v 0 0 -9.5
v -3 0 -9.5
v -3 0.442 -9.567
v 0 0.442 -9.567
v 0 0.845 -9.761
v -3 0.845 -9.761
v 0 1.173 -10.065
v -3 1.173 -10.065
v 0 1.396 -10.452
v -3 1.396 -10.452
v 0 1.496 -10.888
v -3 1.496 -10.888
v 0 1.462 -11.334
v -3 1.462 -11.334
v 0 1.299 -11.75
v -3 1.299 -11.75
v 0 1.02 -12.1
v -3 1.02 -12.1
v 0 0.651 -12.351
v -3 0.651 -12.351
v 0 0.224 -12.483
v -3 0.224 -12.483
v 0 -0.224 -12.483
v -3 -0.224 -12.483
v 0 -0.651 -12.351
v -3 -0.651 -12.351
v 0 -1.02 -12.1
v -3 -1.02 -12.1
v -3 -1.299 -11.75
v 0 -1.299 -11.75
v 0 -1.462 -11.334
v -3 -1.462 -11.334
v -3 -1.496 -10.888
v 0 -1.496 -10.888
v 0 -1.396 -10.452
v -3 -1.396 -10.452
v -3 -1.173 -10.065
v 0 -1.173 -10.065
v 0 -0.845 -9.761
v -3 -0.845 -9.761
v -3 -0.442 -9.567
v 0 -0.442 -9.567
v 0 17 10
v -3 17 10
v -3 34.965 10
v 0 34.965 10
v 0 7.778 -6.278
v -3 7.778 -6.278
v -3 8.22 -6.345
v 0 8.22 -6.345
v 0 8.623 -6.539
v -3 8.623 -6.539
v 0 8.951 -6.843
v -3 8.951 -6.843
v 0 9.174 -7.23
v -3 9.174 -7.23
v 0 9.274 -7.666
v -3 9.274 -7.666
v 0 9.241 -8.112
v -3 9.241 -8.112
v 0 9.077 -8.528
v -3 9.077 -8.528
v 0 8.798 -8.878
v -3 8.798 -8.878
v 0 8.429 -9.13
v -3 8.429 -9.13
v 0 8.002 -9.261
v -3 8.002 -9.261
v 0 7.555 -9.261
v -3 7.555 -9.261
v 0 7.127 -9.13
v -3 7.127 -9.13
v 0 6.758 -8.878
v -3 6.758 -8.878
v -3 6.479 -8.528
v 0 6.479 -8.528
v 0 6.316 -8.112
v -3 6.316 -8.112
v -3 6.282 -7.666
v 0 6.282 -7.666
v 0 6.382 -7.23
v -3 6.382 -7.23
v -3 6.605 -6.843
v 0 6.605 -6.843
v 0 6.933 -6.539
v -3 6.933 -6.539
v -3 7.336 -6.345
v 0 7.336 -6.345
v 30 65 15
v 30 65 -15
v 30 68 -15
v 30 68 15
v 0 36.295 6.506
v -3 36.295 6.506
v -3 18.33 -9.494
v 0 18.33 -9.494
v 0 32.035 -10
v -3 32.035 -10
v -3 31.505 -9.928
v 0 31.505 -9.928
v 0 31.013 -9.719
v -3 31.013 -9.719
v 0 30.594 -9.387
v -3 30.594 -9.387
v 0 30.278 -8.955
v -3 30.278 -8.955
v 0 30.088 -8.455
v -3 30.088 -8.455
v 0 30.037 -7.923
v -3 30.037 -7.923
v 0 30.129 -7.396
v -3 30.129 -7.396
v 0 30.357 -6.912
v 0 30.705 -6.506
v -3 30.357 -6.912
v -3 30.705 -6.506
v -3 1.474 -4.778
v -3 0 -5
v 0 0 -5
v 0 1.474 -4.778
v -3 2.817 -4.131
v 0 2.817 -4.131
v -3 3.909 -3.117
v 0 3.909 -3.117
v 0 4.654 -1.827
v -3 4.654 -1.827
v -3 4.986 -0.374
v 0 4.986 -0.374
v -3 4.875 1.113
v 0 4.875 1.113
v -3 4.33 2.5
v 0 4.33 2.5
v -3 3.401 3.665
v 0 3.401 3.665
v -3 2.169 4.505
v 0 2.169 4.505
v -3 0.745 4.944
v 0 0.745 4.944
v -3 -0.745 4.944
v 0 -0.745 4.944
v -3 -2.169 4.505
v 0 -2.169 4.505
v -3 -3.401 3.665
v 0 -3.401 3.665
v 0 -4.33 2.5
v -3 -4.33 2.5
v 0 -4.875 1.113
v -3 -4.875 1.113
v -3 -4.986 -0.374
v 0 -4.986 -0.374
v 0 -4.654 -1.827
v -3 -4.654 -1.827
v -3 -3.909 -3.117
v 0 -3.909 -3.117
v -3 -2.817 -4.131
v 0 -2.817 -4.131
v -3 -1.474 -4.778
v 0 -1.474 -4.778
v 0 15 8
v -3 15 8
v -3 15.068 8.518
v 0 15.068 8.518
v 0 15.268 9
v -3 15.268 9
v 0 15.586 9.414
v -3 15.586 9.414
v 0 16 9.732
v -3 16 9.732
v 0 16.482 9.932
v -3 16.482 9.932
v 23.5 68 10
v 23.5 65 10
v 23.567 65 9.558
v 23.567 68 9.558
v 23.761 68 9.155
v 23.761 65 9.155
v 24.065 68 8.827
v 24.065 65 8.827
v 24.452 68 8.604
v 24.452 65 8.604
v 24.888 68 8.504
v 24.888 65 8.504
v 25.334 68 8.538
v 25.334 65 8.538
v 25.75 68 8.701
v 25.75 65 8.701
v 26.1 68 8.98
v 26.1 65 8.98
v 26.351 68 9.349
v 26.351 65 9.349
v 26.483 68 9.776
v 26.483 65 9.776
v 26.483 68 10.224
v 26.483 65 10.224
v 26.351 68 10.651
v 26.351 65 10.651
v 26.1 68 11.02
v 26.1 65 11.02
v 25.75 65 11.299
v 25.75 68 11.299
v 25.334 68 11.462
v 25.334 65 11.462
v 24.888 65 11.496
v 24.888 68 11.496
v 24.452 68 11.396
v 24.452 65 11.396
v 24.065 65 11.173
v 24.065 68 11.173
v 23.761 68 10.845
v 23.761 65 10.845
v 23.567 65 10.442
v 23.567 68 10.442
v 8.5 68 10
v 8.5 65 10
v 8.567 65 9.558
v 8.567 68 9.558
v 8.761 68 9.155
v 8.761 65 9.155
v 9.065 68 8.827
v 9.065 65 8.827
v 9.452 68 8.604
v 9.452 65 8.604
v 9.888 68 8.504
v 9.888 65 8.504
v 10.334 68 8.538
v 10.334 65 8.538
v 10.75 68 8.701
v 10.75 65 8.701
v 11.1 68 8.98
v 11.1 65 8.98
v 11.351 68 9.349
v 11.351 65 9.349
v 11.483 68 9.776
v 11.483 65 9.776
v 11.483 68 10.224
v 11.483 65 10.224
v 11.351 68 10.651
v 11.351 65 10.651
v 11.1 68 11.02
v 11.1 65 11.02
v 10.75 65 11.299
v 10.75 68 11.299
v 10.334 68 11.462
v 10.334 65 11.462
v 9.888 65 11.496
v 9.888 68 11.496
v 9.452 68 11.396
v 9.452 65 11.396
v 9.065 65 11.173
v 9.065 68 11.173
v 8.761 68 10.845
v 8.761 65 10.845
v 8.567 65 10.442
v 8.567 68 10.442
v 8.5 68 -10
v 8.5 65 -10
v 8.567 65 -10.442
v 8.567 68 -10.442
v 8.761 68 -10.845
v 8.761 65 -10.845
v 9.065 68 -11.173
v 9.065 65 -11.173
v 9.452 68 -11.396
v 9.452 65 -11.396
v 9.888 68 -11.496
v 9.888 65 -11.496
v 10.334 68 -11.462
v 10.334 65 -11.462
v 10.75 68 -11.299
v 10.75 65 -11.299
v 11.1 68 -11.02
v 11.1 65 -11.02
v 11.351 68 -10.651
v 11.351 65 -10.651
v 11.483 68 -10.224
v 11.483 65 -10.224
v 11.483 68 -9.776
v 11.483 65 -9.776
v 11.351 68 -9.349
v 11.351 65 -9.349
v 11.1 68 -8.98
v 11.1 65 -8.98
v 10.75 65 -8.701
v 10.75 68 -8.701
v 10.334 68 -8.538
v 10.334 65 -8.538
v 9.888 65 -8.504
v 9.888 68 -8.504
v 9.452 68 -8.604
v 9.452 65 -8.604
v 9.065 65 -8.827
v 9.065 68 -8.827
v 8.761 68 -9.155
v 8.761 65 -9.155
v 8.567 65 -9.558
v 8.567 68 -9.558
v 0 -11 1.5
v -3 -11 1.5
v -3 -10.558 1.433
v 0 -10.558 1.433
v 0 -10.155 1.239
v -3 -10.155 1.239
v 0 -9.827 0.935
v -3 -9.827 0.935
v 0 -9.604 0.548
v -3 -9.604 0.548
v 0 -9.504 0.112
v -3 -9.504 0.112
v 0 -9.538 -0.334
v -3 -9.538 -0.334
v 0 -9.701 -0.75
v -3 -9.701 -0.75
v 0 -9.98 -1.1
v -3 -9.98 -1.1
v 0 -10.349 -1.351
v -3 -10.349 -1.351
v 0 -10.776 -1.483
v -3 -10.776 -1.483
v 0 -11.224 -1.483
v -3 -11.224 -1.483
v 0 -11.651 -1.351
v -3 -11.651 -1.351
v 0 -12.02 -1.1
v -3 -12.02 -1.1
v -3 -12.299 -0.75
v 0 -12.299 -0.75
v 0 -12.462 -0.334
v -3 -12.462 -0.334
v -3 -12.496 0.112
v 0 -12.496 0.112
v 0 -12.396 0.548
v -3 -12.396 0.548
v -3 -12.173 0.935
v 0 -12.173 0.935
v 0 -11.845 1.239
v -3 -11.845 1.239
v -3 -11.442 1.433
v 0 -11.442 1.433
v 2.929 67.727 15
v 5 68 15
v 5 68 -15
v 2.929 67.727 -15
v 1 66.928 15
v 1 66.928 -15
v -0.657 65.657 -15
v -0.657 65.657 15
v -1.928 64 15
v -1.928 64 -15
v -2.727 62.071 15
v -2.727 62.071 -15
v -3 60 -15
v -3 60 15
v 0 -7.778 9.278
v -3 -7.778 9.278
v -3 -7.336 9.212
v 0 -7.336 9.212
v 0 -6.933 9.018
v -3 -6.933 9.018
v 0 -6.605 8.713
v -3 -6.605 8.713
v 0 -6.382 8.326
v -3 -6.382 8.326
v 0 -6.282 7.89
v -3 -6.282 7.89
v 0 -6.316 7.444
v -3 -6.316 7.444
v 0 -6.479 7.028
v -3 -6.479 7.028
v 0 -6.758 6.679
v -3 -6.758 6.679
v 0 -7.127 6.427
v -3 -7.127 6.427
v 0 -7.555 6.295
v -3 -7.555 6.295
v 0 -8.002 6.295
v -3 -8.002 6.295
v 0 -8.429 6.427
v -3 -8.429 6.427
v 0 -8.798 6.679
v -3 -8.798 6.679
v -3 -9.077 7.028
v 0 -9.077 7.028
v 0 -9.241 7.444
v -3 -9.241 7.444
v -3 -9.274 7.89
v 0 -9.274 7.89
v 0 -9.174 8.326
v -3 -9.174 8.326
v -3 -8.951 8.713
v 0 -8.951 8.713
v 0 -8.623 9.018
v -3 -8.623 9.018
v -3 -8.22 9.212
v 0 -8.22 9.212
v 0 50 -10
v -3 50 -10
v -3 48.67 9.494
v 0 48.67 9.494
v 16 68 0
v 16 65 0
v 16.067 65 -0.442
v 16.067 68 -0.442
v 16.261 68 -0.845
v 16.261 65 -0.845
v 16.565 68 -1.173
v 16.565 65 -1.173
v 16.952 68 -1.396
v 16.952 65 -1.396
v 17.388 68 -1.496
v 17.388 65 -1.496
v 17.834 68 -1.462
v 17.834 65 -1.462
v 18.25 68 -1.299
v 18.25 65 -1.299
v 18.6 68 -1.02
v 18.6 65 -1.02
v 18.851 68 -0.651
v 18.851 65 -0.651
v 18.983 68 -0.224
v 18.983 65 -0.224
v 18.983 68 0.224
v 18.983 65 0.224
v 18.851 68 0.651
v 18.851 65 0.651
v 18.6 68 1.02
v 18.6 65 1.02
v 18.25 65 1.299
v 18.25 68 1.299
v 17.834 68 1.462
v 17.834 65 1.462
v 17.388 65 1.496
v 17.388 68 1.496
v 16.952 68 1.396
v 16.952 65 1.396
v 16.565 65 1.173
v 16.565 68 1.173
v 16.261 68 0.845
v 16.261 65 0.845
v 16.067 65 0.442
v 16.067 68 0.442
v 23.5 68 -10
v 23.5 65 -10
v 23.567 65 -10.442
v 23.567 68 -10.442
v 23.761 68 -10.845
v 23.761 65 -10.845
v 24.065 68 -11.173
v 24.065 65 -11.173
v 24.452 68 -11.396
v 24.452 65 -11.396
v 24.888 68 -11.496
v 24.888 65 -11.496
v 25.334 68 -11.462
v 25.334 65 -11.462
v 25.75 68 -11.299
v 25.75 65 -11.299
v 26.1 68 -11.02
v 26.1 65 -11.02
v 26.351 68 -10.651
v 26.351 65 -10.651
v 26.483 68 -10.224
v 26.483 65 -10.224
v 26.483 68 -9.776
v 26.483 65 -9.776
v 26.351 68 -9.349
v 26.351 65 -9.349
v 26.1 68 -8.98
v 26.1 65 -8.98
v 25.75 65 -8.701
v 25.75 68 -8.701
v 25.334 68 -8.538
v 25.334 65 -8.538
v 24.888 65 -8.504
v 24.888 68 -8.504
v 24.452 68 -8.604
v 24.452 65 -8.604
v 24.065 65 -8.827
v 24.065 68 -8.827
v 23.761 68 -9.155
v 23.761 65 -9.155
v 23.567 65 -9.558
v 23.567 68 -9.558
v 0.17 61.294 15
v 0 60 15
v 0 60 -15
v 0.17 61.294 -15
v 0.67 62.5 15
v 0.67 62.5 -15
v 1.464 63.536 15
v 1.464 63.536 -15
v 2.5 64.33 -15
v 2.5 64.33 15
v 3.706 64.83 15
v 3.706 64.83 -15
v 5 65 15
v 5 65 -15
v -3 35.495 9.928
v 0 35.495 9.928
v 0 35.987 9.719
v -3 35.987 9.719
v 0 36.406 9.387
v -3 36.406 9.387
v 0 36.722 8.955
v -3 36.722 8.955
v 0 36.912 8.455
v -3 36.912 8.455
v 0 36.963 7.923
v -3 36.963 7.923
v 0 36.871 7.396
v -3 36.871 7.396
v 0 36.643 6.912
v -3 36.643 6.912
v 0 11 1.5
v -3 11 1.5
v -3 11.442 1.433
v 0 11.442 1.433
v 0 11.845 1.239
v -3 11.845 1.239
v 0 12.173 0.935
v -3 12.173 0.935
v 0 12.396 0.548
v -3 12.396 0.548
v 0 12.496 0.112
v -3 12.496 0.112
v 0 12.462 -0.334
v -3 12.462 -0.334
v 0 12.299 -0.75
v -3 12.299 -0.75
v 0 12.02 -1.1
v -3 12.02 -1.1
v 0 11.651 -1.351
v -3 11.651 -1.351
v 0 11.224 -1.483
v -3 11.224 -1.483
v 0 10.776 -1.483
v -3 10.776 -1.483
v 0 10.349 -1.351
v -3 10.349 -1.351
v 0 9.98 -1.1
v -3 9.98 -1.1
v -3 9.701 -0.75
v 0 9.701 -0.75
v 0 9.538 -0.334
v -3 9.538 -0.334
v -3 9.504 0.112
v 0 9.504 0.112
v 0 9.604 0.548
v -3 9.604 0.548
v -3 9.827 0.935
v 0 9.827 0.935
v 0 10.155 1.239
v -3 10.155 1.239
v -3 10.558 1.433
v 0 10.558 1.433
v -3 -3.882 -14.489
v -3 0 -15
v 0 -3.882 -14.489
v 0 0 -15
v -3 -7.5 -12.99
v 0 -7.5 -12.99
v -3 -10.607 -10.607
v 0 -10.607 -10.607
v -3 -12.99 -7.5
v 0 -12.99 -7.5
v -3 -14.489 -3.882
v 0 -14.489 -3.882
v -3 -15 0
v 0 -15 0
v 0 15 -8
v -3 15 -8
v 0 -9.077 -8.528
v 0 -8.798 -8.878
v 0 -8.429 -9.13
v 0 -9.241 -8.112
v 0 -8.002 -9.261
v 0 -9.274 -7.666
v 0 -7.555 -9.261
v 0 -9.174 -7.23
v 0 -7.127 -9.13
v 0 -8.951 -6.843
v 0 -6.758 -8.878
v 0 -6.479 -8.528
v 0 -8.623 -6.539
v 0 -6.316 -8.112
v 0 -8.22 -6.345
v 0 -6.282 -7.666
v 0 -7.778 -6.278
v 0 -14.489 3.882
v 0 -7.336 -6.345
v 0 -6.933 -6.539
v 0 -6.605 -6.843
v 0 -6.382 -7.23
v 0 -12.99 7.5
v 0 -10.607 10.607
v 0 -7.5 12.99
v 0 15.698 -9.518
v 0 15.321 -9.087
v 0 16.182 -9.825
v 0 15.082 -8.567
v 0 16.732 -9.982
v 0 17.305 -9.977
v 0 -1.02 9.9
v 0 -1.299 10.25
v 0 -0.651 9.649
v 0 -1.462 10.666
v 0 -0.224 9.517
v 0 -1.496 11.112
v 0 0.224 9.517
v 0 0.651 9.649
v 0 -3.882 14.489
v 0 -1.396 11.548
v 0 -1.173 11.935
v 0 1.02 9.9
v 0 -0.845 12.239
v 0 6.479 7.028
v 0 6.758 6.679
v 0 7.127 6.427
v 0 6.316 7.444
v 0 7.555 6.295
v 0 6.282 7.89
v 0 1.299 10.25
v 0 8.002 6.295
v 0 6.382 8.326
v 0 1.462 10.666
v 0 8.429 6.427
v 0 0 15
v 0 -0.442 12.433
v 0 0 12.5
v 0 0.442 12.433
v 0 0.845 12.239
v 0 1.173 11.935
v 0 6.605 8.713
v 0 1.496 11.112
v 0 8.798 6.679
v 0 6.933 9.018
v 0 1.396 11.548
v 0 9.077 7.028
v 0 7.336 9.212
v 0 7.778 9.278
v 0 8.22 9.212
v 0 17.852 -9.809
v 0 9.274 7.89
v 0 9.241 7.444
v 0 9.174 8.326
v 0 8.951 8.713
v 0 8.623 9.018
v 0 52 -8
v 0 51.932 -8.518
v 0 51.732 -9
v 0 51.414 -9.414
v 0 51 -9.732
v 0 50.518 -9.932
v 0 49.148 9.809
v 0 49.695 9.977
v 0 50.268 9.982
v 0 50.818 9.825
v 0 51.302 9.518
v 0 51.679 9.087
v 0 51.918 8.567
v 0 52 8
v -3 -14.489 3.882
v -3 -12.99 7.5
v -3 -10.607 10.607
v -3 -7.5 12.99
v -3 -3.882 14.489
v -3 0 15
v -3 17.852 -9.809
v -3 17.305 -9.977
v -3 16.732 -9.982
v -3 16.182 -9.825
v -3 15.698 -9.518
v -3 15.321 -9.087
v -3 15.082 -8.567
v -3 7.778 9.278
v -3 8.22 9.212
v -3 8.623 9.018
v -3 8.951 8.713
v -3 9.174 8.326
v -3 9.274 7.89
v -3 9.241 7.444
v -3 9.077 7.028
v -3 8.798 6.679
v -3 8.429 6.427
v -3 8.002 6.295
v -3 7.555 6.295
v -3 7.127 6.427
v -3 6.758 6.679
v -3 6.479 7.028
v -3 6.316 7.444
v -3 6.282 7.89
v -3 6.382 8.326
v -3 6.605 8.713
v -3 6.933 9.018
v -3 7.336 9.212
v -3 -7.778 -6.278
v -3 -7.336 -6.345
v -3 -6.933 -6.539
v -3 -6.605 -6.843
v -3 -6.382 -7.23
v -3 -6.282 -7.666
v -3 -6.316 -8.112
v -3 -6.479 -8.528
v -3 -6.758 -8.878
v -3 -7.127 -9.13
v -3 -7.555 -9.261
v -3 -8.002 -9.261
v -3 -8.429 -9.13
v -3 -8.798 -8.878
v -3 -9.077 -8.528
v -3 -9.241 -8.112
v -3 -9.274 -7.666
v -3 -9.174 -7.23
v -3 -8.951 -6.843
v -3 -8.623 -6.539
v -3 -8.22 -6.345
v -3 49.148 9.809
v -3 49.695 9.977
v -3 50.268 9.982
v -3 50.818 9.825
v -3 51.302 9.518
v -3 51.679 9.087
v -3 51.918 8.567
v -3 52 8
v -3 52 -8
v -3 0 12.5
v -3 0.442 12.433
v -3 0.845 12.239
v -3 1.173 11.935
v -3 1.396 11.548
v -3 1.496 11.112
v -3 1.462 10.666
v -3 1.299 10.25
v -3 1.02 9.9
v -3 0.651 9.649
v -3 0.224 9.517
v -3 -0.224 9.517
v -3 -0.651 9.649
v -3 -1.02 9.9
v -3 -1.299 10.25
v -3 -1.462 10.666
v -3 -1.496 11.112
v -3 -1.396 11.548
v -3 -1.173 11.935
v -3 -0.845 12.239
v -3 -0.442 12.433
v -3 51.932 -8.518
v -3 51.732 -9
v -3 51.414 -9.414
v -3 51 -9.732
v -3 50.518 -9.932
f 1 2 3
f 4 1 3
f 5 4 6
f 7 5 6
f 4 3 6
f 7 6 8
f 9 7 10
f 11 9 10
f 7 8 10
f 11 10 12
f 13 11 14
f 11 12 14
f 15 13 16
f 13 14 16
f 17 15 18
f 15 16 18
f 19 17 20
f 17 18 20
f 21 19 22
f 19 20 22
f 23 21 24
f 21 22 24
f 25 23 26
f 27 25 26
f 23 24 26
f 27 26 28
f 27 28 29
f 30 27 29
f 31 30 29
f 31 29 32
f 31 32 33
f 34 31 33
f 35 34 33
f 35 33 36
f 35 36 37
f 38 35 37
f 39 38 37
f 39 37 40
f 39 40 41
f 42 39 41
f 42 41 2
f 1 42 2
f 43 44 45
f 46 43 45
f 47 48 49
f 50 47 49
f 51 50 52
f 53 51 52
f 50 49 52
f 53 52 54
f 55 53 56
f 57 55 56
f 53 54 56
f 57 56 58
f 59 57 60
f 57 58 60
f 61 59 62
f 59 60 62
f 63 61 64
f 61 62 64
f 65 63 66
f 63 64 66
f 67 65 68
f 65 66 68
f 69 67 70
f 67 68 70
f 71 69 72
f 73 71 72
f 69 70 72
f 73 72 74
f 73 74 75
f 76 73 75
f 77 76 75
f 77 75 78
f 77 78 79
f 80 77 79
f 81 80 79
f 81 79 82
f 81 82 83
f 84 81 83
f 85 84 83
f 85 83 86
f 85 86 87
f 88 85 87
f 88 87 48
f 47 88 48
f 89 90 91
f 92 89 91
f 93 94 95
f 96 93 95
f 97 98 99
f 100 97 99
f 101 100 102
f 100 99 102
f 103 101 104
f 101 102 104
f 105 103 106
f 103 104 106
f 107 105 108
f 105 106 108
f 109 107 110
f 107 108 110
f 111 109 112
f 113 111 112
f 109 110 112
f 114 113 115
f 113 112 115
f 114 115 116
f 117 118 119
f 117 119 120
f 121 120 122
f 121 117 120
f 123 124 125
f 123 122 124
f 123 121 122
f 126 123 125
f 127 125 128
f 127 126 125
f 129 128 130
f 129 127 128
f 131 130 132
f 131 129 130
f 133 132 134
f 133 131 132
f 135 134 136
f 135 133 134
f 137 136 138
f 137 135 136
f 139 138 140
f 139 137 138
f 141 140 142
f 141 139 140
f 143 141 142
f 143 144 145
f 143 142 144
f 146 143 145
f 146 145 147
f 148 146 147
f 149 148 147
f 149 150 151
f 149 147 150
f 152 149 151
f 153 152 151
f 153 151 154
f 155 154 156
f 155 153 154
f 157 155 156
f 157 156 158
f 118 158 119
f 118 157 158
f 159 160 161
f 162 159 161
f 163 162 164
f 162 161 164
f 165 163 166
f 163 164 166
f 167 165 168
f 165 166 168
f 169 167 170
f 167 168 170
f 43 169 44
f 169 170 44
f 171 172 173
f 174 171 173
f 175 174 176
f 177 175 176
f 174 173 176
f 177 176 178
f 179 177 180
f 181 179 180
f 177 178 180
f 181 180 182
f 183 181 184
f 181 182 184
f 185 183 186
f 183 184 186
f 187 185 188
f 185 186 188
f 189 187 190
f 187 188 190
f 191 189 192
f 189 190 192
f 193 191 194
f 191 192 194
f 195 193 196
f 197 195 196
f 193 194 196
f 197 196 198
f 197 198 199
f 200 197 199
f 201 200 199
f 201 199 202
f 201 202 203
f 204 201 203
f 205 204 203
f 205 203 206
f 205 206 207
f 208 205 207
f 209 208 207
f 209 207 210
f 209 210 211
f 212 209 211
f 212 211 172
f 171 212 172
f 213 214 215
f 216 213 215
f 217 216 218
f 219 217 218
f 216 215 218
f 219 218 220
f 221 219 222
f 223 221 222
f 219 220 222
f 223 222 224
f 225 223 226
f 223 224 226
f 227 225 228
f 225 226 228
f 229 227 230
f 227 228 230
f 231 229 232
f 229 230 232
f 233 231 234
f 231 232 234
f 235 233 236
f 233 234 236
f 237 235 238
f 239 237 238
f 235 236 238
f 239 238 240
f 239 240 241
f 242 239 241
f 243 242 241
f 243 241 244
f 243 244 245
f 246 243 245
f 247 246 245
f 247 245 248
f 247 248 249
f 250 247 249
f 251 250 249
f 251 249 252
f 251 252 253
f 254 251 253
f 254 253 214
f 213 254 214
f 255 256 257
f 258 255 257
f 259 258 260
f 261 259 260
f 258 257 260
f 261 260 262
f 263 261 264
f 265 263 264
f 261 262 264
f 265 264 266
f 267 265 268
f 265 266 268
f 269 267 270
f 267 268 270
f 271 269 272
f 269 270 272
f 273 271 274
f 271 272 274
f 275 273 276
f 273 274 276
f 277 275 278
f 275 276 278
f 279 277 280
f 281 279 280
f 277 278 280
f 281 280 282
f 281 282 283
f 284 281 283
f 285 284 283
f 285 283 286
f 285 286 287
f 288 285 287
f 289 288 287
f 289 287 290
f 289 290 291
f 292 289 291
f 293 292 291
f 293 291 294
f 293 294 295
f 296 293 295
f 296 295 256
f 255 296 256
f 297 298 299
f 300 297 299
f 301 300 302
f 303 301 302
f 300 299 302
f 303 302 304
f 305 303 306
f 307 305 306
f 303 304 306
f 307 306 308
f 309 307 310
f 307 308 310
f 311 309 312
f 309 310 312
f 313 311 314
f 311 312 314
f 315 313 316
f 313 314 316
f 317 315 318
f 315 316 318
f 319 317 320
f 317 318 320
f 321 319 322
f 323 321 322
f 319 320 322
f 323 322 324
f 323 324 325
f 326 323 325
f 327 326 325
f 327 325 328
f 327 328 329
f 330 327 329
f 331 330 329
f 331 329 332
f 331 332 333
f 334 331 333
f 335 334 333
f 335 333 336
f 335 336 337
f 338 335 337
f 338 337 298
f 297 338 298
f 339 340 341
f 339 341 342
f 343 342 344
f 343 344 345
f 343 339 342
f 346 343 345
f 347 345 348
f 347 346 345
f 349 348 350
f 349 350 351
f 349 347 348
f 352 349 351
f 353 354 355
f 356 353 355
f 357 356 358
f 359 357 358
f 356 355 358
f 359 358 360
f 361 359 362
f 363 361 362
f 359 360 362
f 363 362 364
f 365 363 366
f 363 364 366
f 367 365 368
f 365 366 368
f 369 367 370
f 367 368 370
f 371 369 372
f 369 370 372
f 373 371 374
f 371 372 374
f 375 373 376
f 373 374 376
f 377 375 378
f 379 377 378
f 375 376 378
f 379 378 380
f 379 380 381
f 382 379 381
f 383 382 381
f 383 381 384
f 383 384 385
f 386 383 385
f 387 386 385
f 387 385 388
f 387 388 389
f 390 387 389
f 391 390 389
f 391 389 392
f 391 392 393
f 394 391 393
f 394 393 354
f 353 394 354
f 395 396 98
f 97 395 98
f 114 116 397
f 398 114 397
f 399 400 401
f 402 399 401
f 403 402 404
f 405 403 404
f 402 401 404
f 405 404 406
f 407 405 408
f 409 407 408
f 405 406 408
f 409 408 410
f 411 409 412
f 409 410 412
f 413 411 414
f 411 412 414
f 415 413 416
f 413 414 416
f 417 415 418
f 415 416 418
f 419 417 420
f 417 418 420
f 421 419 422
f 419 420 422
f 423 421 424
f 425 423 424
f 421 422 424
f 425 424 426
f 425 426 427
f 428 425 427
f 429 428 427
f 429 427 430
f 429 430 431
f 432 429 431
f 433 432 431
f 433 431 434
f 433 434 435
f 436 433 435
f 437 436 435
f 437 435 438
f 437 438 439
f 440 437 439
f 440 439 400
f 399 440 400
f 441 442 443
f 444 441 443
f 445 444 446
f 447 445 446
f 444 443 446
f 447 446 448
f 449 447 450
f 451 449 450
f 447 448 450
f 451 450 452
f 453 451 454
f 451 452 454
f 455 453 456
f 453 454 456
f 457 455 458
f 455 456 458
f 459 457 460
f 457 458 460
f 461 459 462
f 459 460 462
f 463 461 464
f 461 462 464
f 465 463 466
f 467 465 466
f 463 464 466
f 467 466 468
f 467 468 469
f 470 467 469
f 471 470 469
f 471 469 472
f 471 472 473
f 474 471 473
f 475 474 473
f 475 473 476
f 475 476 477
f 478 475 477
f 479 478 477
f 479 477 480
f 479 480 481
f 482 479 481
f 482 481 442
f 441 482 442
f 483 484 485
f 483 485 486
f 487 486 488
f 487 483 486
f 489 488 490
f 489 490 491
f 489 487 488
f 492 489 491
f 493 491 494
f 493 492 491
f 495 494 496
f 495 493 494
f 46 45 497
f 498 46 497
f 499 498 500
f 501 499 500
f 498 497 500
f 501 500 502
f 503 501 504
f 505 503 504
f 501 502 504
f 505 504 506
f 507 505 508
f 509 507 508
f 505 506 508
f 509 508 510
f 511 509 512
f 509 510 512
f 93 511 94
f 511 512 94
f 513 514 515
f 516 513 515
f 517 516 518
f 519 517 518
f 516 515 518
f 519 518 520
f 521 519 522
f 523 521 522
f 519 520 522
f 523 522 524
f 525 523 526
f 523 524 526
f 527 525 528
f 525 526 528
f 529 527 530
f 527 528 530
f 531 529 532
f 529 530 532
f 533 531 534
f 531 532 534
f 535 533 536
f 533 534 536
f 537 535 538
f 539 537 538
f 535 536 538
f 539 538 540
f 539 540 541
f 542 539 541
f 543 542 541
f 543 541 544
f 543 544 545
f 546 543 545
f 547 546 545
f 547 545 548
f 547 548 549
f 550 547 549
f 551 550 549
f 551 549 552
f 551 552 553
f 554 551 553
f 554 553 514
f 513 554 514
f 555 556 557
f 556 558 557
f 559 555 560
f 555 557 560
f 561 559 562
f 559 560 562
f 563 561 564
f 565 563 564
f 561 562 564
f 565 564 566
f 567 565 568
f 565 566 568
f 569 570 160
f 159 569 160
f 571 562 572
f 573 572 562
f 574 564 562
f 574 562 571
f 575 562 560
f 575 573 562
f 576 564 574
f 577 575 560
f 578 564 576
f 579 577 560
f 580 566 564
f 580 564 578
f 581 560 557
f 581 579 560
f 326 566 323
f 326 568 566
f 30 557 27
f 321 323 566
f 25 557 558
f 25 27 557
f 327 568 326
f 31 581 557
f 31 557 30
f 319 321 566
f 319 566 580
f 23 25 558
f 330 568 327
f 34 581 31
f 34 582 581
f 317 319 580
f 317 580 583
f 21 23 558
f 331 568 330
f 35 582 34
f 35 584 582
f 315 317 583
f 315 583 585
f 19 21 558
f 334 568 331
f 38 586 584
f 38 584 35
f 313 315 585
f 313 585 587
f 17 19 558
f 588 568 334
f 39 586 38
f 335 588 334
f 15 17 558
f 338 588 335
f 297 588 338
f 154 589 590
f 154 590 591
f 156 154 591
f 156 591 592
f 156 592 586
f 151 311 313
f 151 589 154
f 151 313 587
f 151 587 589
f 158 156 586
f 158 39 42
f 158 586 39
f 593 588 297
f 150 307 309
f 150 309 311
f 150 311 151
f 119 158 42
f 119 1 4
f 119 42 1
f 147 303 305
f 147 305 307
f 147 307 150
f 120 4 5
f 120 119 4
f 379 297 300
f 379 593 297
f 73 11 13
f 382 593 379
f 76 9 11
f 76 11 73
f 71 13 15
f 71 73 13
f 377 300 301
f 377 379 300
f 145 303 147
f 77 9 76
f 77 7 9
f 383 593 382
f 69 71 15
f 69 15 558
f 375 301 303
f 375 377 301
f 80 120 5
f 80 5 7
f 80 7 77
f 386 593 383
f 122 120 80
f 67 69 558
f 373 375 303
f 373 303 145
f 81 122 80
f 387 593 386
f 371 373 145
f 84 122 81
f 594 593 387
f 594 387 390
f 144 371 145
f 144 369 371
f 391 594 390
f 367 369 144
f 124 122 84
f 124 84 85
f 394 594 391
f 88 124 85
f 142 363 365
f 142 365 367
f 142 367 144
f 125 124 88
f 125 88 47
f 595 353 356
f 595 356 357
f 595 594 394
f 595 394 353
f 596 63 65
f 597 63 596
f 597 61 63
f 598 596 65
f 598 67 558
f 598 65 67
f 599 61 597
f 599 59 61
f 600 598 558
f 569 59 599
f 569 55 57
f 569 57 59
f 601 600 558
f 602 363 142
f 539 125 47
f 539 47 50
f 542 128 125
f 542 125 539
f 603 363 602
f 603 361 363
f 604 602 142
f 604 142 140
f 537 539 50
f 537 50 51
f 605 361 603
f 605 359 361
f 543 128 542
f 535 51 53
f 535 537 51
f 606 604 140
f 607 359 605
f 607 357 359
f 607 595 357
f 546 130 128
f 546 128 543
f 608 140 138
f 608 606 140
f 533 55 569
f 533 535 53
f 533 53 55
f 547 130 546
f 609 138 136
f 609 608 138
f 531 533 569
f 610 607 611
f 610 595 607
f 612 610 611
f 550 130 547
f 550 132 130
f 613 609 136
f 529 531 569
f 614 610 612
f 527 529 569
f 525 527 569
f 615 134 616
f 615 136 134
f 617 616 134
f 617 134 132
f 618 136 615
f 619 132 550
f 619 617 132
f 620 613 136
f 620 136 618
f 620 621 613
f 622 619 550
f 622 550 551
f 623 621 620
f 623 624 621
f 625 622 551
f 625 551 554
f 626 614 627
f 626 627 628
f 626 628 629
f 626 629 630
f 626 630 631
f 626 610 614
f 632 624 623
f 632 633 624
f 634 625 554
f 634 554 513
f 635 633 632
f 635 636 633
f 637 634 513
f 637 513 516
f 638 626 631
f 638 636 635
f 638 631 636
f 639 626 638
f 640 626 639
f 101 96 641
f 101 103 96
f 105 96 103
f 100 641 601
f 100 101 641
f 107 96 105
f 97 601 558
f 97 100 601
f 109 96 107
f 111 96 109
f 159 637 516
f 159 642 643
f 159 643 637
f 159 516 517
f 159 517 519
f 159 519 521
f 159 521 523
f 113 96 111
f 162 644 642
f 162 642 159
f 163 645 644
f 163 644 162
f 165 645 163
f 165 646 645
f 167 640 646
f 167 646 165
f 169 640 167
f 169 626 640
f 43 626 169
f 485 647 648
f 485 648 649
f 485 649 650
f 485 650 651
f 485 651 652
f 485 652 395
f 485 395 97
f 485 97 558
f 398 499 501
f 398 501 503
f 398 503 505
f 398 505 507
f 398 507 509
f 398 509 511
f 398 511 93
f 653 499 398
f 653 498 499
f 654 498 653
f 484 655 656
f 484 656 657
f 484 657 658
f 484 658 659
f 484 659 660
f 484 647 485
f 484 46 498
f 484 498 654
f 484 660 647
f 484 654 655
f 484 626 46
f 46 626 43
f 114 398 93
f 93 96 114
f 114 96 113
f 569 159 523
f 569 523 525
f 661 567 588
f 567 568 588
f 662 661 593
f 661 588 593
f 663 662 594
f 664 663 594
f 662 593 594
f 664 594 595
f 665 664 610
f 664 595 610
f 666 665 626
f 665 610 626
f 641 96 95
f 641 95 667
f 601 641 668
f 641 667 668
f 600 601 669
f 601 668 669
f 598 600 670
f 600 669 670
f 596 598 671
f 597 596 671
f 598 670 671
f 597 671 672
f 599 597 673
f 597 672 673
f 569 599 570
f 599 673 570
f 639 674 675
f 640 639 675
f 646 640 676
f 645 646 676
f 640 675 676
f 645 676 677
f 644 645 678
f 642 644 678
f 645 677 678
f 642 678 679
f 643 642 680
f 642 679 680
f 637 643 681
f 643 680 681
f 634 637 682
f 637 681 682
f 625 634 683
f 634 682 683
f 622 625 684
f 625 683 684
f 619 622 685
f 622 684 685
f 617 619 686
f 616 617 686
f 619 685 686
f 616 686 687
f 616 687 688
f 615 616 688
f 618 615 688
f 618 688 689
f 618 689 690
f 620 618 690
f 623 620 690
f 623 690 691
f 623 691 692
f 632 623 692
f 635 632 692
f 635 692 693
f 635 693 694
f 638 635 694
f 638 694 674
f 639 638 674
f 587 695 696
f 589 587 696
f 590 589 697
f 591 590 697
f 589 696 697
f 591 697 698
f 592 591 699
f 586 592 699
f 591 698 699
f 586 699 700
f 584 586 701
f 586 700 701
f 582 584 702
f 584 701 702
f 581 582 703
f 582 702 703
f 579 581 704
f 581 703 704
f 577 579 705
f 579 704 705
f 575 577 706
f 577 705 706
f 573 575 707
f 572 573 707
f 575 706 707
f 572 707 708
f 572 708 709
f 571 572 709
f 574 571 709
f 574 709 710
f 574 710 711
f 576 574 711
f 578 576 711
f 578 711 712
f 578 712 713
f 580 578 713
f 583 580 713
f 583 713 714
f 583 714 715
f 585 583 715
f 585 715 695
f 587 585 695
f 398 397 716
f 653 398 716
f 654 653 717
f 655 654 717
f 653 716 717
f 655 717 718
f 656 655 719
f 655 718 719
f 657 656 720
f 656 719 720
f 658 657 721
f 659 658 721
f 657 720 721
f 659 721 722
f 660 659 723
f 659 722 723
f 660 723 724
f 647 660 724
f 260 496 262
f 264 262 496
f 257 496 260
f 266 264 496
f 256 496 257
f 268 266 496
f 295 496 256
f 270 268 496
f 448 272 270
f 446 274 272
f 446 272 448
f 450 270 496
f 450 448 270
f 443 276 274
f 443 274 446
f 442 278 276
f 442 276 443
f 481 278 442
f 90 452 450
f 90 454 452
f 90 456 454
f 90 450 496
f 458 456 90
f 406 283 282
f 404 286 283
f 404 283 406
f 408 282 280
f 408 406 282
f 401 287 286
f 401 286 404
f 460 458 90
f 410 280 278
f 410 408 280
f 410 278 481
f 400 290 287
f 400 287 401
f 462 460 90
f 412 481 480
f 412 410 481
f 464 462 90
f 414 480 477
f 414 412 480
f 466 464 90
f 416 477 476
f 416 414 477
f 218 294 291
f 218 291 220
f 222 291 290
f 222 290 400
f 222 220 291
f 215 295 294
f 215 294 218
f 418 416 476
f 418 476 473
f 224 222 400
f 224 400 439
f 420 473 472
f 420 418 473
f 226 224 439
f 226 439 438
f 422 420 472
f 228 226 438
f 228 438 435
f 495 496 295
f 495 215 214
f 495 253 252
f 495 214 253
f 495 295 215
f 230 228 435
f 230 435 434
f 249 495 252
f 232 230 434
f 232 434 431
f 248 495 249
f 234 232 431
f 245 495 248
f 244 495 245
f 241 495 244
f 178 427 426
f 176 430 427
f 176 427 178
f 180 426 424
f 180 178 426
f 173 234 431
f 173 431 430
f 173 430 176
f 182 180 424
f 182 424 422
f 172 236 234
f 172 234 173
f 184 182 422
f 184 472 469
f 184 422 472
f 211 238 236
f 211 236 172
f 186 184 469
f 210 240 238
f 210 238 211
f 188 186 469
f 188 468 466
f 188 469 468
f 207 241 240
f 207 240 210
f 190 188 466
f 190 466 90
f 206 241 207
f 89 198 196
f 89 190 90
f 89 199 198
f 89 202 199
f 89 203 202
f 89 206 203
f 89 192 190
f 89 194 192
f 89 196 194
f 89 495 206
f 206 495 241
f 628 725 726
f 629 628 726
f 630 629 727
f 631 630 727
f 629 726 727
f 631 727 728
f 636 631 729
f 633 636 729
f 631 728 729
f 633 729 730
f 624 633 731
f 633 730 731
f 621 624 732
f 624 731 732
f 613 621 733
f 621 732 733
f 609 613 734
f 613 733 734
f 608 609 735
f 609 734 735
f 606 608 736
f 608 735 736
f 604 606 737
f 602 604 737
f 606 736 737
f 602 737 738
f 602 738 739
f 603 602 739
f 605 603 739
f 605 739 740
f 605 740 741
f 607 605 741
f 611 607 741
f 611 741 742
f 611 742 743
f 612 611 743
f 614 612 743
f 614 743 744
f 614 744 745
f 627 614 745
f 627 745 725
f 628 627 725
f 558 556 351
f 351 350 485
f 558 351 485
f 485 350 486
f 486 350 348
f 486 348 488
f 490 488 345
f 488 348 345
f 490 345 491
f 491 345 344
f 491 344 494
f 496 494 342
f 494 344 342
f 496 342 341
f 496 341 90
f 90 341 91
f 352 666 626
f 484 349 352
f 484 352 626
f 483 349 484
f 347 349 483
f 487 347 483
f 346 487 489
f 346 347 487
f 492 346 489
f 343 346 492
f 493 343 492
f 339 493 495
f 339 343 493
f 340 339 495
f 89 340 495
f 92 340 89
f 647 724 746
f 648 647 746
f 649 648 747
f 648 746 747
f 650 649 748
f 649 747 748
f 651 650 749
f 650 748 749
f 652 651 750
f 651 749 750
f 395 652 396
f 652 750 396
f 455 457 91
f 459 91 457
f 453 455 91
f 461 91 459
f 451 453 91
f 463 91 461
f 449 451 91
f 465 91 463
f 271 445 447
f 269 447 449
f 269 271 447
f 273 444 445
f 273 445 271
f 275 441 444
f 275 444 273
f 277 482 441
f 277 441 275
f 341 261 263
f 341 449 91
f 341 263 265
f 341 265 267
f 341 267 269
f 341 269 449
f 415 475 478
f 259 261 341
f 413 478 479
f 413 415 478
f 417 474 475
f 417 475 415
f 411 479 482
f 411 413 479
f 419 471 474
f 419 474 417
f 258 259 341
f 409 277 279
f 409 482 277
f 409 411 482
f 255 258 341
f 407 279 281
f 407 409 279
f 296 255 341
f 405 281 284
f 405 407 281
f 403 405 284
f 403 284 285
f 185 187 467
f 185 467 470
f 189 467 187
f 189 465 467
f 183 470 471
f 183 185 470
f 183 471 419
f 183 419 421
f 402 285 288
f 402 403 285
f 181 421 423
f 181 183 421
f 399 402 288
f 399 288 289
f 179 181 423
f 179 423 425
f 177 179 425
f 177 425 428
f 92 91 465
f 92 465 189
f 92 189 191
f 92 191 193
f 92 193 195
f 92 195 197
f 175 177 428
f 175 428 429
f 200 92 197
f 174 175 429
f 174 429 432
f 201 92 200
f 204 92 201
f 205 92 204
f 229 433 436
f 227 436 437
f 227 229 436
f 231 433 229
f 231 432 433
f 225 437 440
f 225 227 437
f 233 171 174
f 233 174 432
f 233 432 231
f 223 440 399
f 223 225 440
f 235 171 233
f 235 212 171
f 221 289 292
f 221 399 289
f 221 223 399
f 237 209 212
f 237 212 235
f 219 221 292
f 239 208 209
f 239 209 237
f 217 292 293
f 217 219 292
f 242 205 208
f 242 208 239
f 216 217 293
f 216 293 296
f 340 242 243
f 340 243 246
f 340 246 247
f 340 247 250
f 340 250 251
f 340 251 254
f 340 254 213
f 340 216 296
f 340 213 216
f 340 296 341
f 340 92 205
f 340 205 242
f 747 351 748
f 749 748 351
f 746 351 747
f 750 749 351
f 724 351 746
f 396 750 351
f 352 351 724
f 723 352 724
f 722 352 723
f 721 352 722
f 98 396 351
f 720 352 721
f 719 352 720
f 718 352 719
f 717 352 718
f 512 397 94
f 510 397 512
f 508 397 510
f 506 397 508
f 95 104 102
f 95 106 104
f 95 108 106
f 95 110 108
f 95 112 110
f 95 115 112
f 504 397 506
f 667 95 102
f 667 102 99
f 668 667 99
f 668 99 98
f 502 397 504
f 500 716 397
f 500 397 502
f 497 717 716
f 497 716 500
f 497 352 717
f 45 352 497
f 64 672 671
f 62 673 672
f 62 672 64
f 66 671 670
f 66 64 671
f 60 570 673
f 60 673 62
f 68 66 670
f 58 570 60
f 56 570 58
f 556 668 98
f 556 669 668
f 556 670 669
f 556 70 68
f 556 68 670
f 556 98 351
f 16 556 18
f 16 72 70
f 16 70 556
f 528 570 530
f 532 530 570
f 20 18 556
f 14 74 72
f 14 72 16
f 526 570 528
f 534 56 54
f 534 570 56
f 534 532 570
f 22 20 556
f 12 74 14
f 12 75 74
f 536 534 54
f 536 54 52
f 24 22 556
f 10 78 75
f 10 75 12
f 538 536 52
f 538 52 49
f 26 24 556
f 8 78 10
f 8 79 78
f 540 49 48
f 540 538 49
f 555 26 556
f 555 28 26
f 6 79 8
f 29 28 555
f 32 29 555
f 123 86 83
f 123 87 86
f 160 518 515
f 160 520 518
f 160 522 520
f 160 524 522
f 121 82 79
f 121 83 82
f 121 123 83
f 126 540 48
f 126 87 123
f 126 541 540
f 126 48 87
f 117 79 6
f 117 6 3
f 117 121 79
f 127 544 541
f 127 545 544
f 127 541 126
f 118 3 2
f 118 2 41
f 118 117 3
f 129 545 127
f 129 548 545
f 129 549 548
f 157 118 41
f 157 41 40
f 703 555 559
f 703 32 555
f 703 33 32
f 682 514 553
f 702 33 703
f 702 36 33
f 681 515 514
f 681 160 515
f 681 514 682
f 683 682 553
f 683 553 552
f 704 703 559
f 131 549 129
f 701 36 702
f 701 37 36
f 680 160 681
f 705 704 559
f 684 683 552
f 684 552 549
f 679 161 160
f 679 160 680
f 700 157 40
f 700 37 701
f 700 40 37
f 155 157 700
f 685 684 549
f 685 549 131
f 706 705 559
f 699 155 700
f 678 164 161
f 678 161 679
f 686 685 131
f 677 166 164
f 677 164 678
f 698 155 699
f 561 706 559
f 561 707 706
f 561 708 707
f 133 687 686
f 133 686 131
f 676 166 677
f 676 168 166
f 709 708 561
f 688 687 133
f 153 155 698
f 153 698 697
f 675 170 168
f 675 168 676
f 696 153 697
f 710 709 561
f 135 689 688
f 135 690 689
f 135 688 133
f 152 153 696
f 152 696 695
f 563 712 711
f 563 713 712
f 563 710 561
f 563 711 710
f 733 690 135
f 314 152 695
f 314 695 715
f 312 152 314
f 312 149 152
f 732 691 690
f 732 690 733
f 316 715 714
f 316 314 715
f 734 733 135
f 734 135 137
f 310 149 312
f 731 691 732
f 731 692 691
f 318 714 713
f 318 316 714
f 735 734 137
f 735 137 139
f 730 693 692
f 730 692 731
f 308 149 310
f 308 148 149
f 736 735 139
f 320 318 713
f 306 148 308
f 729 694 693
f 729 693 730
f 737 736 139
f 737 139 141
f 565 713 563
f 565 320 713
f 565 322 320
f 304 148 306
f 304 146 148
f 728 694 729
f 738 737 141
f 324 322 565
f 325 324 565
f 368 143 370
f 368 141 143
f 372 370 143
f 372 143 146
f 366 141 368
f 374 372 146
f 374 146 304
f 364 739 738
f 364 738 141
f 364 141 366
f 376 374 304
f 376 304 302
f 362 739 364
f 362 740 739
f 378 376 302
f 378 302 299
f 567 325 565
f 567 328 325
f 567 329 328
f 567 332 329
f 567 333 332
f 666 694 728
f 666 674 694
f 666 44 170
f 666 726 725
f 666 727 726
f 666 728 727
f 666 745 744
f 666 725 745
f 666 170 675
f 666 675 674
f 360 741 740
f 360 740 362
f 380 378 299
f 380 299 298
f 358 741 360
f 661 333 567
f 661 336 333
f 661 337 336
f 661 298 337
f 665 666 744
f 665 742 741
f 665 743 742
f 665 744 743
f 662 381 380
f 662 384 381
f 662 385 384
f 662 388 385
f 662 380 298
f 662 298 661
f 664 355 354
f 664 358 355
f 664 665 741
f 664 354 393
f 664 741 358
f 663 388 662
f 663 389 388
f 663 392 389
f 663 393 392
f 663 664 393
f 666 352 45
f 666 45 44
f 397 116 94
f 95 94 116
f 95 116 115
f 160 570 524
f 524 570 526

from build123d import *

# Parameters (mm, degrees)
BASIS_BLECH1_DEPTH                   = 15
SCHNITT_LINEAR_AUSTRAGEN1_DEPTH      = 76.822160349
SCHNITT_LINEAR_AUSTRAGEN1_DEPTH_BACK = 76.822160349
SKIZZE2_R                            = 5
VERRUNDUNG1_R                        = 15
F_3_0_3_DURCHMESSER_BOHRUNG1_D       = 3
F_3_0MM_DOWEL_HOLE1_D                = 3


# Sheet-metal steps are written as plain solids
with BuildPart() as part:
    # Skizze1 → Basis-Blech1 (new, symmetric)
    with BuildSketch(Plane.XY):
        with BuildLine():
            Line((0, -15), (0, 60))
            ThreePointArc((0, 60), (1.464466094, 63.535533906), (5, 65))
            Line((5, 65), (30, 65))
            Line((30, 65), (30, 68))
            Line((30, 68), (5, 68))
            ThreePointArc((5, 68), (-0.656854249, 65.656854249), (-3, 60))
            Line((-3, 60), (-3, -15))
            Line((-3, -15), (0, -15))
        make_face()
    extrude(amount=BASIS_BLECH1_DEPTH, both=True)

    # Skizze2 → Schnitt-Linear austragen1 (cut, two sides: drawn at the far end of the back side and taken through both)
    with BuildSketch(Plane(origin=(0, 0, 0), x_dir=(0, 0, -1), z_dir=(1, 0, 0)).offset(-SCHNITT_LINEAR_AUSTRAGEN1_DEPTH_BACK)):
        Circle(SKIZZE2_R)
        with BuildLine():
            Line((-8, 52), (8, 52))
            ThreePointArc((8, 52), (9.414213562, 51.414213562), (10, 50))
            Line((10, 50), (10, 32.035443619))
            ThreePointArc((10, 32.035443619), (8.711675965, 30.166348298), (6.506482679, 30.705253403))
            Line((6.506482679, 30.705253403), (-9.493517321, 48.669809784))
            ThreePointArc((-9.493517321, 48.669809784), (-9.824880877, 50.818419076), (-8, 52))
        make_face()
        with BuildLine():
            Line((-6.506482679, 36.294746597), (9.493517321, 18.330190216))
            ThreePointArc((9.493517321, 18.330190216), (9.824880877, 16.181580924), (8, 15))
            Line((8, 15), (-8, 15))
            ThreePointArc((-8, 15), (-9.414213562, 15.585786438), (-10, 17))
            Line((-10, 17), (-10, 34.964556381))
            ThreePointArc((-10, 34.964556381), (-8.711675965, 36.833651702), (-6.506482679, 36.294746597))
        make_face()
    extrude(amount=SCHNITT_LINEAR_AUSTRAGEN1_DEPTH + SCHNITT_LINEAR_AUSTRAGEN1_DEPTH_BACK, mode=Mode.SUBTRACT)

    # Verrundung1
    verrundung1_edges = [part.edges().sort_by_distance(p)[0] for p in [
        (-1.5, -15, -15),
        (-1.5, -15, 15),
    ]]
    fillet(verrundung1_edges, radius=VERRUNDUNG1_R - 0.0001)  # a hair under: the kernel refuses the full size

    # Ø3.0 (3) Durchmesser Bohrung1 (through all)
    with Locations(Plane(origin=(0, 0, 0), x_dir=(0, 0, -1), z_dir=(1, 0, 0))):
        with Locations((11, 0), (7.778174593, 7.778174593), (0, 11), (-7.778174593, 7.778174593), (-11, 0), (-7.778174593, -7.778174593), (0, -11), (7.778174593, -7.778174593)):
            Hole(F_3_0_3_DURCHMESSER_BOHRUNG1_D / 2)

    # Ø3.0mm Dowel Hole1 (through all)
    with Locations(Plane(origin=(0, 68, 0), x_dir=(1, 0, 0), z_dir=(0, 1, 0))):
        with Locations((10, 10), (25, 10), (17.5, 0), (10, -10), (25, -10)):
            Hole(F_3_0MM_DOWEL_HOLE1_D / 2)


solid = part.part
